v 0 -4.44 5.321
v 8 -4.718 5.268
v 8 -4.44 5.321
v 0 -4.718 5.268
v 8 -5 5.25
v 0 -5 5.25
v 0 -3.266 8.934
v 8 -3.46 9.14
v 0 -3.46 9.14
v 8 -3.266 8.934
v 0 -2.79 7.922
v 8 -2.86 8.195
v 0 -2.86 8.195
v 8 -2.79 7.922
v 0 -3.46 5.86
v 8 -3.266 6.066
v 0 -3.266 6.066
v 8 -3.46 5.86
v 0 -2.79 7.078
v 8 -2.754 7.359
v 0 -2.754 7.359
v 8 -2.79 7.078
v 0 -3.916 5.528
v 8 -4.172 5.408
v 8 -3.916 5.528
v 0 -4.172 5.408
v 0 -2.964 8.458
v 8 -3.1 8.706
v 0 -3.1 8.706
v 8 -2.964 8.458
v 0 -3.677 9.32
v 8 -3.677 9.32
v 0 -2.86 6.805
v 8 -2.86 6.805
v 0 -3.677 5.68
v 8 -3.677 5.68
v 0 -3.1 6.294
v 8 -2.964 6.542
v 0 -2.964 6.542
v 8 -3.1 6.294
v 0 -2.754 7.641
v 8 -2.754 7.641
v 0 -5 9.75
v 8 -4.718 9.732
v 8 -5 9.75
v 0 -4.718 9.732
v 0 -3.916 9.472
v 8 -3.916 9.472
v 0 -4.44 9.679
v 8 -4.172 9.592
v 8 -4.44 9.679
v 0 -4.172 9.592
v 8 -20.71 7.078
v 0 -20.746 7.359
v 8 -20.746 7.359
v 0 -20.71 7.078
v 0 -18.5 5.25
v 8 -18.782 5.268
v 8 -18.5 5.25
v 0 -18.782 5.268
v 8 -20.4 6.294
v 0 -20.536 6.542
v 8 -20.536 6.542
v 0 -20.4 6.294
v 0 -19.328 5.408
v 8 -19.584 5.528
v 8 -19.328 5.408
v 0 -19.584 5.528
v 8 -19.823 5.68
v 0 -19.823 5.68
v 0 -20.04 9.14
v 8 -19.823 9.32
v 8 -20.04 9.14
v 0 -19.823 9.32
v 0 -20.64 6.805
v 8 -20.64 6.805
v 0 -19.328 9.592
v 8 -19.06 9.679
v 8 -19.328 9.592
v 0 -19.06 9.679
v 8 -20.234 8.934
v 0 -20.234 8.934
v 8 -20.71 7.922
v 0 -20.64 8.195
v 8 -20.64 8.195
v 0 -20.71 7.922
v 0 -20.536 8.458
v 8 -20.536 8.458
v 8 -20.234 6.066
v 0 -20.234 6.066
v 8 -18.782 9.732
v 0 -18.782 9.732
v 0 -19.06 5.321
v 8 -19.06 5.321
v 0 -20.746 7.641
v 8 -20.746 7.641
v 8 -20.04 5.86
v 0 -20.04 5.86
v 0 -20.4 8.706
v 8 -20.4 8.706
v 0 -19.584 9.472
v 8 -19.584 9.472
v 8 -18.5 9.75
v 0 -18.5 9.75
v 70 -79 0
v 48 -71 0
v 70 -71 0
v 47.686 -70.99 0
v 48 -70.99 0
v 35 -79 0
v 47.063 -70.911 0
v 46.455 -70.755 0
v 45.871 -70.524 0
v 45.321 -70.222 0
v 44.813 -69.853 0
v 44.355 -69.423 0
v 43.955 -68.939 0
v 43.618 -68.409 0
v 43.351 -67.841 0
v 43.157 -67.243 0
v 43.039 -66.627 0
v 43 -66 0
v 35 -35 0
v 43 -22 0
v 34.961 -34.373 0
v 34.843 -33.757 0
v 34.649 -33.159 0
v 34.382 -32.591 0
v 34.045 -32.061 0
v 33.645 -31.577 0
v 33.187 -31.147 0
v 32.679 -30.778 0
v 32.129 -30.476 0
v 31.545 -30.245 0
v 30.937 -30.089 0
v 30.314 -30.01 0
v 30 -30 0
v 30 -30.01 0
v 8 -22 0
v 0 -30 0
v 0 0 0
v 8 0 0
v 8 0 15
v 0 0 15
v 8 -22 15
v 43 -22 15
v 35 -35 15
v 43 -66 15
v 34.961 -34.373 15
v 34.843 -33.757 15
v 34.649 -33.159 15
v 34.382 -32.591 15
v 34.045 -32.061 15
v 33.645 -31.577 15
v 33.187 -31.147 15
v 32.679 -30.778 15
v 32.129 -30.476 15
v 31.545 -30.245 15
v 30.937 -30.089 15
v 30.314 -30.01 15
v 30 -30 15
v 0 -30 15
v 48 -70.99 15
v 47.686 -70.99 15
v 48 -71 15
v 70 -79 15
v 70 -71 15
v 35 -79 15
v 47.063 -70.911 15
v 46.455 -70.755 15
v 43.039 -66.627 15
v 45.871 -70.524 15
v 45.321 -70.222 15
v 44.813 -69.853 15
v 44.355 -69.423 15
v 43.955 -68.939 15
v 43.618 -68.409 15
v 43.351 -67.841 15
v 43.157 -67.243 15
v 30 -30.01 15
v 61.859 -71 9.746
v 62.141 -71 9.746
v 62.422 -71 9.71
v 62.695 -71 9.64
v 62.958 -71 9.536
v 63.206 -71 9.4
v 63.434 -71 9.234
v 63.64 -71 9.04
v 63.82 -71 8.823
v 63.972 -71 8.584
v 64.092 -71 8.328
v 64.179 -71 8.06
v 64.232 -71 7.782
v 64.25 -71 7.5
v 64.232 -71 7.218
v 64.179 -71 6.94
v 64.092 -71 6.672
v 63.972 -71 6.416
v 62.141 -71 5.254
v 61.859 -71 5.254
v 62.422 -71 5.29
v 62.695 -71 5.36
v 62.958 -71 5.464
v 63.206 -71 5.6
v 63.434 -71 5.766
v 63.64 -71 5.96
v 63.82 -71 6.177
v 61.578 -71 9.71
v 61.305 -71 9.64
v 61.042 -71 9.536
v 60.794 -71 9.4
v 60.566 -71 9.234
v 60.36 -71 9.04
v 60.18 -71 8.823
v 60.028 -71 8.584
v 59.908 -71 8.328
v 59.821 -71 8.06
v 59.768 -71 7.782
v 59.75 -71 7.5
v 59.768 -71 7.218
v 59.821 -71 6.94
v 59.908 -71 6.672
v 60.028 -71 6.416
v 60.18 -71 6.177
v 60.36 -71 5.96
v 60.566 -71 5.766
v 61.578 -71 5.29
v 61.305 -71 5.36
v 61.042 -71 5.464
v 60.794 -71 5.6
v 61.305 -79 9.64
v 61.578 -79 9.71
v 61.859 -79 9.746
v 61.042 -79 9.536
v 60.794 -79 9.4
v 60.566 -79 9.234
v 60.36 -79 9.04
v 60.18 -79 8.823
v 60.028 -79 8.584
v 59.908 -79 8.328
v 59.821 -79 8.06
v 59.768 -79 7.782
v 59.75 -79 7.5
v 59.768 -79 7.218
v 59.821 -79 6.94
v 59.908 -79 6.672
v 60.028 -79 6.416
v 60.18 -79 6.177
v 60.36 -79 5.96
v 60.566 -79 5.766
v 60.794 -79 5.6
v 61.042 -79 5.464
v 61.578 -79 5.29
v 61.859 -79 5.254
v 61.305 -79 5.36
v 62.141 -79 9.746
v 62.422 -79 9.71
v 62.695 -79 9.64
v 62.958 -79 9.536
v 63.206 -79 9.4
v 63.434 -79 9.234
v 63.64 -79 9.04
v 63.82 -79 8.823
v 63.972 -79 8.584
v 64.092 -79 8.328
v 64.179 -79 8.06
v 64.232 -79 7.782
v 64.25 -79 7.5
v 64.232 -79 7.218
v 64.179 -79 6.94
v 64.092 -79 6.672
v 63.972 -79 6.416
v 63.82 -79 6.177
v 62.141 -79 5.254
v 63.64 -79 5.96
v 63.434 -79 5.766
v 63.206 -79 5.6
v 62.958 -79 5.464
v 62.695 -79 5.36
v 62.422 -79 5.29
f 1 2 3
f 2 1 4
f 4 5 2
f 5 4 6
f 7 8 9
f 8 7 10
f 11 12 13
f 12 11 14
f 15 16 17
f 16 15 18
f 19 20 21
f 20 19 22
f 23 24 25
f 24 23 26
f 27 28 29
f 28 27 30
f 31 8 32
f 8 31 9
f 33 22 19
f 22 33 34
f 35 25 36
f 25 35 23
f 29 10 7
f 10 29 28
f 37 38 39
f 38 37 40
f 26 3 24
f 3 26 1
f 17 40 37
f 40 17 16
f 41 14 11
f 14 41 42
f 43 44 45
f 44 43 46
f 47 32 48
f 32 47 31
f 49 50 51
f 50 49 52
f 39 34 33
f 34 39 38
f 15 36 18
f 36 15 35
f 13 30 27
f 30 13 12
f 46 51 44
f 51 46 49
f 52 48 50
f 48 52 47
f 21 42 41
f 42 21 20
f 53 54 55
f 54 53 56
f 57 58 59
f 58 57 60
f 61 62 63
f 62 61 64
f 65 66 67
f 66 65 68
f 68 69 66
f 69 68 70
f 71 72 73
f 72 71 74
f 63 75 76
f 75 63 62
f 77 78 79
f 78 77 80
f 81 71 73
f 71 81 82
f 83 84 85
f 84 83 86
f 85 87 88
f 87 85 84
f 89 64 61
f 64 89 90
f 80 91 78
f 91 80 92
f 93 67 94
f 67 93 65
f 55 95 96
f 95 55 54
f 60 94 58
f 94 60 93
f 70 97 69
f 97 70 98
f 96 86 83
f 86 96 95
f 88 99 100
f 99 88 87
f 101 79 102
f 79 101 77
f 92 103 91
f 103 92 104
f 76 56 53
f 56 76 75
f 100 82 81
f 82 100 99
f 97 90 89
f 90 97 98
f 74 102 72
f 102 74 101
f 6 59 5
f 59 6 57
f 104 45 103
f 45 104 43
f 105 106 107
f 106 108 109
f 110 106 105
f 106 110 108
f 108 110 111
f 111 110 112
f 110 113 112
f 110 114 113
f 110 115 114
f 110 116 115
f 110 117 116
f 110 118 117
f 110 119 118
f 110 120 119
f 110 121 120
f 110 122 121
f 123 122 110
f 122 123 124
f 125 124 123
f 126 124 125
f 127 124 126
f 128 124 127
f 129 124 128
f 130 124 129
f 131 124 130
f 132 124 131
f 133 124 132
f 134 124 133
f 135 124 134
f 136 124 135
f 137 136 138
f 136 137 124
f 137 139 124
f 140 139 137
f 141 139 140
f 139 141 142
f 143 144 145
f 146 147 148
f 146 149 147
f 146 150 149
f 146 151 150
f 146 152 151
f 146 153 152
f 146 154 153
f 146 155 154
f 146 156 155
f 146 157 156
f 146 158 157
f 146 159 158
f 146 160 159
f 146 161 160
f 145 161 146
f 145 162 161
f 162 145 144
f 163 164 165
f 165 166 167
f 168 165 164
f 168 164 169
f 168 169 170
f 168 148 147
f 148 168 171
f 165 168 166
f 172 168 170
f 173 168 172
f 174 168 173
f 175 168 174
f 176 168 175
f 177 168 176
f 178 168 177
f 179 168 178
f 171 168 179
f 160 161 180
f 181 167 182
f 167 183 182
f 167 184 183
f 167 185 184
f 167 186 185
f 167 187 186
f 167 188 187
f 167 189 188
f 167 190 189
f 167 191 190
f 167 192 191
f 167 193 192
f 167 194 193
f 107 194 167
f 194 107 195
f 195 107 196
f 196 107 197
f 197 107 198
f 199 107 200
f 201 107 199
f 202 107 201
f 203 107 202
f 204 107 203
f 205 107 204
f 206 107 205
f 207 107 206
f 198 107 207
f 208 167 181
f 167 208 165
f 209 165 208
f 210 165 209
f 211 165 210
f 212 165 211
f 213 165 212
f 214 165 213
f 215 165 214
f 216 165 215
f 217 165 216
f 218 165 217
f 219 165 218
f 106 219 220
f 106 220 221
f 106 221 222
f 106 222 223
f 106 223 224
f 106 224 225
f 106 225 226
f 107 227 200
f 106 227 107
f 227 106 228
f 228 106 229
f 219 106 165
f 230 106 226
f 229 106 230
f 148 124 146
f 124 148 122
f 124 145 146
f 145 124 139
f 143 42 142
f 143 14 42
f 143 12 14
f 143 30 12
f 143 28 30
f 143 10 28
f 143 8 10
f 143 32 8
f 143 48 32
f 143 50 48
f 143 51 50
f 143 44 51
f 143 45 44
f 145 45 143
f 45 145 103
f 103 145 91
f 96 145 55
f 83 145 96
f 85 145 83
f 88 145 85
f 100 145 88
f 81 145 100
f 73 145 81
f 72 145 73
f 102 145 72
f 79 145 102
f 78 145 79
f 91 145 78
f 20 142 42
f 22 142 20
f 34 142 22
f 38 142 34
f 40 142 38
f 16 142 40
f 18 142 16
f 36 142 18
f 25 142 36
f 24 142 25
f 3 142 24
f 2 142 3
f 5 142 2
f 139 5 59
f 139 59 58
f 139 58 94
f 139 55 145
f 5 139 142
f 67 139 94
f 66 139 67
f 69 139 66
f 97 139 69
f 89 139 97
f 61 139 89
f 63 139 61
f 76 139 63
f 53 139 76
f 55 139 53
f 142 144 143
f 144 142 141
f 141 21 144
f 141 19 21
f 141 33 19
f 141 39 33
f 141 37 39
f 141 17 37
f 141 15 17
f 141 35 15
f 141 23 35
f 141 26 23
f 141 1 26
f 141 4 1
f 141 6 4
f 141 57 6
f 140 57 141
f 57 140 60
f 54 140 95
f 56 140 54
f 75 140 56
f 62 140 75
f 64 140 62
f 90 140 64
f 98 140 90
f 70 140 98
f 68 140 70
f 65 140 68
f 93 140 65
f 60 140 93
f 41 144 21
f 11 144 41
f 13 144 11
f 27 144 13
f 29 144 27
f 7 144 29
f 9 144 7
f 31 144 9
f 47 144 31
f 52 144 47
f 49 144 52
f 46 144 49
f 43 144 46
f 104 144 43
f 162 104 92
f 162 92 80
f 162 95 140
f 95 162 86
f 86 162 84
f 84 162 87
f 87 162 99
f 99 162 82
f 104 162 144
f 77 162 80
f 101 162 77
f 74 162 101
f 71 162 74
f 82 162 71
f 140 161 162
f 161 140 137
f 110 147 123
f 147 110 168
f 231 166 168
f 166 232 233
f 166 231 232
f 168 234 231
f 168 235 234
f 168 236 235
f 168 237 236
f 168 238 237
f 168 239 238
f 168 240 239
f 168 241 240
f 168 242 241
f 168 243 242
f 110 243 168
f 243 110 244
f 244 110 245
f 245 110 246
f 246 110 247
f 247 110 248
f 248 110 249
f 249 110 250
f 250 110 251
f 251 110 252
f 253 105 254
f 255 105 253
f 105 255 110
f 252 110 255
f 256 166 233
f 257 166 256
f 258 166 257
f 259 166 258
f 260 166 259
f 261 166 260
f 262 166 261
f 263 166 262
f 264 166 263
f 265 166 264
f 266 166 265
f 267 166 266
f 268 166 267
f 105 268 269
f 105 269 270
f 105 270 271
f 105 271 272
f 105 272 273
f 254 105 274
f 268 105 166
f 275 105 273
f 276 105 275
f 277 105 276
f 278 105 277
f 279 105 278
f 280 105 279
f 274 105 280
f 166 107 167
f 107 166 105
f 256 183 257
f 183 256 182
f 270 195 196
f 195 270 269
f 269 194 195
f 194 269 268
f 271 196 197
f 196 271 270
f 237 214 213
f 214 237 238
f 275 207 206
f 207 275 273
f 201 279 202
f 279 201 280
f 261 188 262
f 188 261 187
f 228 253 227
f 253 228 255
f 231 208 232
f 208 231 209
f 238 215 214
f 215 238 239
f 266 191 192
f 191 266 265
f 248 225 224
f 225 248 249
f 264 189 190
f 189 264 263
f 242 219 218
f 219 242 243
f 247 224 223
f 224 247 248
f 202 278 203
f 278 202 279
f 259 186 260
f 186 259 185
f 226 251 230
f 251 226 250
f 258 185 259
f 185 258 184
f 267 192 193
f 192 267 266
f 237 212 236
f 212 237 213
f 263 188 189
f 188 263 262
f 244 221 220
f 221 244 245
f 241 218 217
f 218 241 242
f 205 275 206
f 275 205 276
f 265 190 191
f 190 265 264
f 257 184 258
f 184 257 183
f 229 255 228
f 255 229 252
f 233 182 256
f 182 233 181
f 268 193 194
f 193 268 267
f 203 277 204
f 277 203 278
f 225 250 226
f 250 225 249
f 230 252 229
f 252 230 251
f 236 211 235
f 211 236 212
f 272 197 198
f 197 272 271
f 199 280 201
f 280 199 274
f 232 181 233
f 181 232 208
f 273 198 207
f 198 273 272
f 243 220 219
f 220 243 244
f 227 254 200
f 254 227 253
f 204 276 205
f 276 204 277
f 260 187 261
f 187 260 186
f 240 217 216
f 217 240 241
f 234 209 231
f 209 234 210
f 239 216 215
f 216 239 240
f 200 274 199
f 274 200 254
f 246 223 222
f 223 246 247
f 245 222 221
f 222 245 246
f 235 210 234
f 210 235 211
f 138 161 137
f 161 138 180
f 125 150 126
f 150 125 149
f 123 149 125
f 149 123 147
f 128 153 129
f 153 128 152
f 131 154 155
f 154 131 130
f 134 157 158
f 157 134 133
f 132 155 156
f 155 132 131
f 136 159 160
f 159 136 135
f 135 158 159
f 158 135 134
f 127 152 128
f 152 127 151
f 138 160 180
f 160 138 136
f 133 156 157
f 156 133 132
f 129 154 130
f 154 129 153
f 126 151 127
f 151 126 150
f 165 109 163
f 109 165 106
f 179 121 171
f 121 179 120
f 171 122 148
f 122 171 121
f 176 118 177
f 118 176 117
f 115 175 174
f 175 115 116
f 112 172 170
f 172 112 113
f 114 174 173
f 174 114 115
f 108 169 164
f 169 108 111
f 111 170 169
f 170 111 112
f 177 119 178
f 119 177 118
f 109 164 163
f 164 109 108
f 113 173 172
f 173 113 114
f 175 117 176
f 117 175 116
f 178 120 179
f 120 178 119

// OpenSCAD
/*
 * file: cabinet-wall-mount.scad
 * author: gregor binder <gregor_reprap@catrix.at>
 * date: 16.11.2013
 * last change: 16.11.2013
 * license: CC BY-NC-SA 3.0
 */

depth=15;
holediameter=4.5;
holelength=18;
thickness=8;
holedistance=5;
length1=30;
length2=49;
length3=35;
length4=35;
radius=5;
$fn=50;

/***********************/

module long_hole(){
	cylinder(h=thickness+5,r=holediameter/2);
	translate([0,-(holelength-holediameter),0])
		cylinder(h=thickness+5,r=holediameter/2);
	translate([-(holediameter/2),-(holelength-holediameter),0])
		cube([holediameter,holelength-holediameter,thickness+5]);
}

module shape(){
linear_extrude(height = depth)
	polygon(points=[
	[0,0],[0,-length1],[length3,-length1],[length3,-(length1+length2)],[length3+length4,-(length1+length2)],[length3+length4,-(length1+length2-thickness)],[length3+thickness,-(length1+length2-thickness)],[length3+thickness,-(length1-thickness)],[thickness,-(length1-thickness)],[thickness,0]],
	paths=[[0,1,2,3,4,5,6,7,8,9]]);
}

module strengthening() {
	translate([-radius,-radius,0])
		difference() {
			cube([radius,radius,depth]);
			translate([0,0,-0.5])
				cylinder(h=depth+5,r=radius);
		}
}

union() {
difference() {
	shape();
	translate([-0.5,-holedistance,depth/2])
		rotate([0,90,0])
			long_hole();
	translate([length3+length4-thickness,-(length1+length2+0.5),depth/2])
		rotate([-90,0,0])
			cylinder(h=thickness+5,r=holediameter/2);
}
translate([length3,-length1,0])
	strengthening();
translate([length3+thickness,0-(length1+length2-thickness),0])
	rotate([0,0,180])
		strengthening();
}
